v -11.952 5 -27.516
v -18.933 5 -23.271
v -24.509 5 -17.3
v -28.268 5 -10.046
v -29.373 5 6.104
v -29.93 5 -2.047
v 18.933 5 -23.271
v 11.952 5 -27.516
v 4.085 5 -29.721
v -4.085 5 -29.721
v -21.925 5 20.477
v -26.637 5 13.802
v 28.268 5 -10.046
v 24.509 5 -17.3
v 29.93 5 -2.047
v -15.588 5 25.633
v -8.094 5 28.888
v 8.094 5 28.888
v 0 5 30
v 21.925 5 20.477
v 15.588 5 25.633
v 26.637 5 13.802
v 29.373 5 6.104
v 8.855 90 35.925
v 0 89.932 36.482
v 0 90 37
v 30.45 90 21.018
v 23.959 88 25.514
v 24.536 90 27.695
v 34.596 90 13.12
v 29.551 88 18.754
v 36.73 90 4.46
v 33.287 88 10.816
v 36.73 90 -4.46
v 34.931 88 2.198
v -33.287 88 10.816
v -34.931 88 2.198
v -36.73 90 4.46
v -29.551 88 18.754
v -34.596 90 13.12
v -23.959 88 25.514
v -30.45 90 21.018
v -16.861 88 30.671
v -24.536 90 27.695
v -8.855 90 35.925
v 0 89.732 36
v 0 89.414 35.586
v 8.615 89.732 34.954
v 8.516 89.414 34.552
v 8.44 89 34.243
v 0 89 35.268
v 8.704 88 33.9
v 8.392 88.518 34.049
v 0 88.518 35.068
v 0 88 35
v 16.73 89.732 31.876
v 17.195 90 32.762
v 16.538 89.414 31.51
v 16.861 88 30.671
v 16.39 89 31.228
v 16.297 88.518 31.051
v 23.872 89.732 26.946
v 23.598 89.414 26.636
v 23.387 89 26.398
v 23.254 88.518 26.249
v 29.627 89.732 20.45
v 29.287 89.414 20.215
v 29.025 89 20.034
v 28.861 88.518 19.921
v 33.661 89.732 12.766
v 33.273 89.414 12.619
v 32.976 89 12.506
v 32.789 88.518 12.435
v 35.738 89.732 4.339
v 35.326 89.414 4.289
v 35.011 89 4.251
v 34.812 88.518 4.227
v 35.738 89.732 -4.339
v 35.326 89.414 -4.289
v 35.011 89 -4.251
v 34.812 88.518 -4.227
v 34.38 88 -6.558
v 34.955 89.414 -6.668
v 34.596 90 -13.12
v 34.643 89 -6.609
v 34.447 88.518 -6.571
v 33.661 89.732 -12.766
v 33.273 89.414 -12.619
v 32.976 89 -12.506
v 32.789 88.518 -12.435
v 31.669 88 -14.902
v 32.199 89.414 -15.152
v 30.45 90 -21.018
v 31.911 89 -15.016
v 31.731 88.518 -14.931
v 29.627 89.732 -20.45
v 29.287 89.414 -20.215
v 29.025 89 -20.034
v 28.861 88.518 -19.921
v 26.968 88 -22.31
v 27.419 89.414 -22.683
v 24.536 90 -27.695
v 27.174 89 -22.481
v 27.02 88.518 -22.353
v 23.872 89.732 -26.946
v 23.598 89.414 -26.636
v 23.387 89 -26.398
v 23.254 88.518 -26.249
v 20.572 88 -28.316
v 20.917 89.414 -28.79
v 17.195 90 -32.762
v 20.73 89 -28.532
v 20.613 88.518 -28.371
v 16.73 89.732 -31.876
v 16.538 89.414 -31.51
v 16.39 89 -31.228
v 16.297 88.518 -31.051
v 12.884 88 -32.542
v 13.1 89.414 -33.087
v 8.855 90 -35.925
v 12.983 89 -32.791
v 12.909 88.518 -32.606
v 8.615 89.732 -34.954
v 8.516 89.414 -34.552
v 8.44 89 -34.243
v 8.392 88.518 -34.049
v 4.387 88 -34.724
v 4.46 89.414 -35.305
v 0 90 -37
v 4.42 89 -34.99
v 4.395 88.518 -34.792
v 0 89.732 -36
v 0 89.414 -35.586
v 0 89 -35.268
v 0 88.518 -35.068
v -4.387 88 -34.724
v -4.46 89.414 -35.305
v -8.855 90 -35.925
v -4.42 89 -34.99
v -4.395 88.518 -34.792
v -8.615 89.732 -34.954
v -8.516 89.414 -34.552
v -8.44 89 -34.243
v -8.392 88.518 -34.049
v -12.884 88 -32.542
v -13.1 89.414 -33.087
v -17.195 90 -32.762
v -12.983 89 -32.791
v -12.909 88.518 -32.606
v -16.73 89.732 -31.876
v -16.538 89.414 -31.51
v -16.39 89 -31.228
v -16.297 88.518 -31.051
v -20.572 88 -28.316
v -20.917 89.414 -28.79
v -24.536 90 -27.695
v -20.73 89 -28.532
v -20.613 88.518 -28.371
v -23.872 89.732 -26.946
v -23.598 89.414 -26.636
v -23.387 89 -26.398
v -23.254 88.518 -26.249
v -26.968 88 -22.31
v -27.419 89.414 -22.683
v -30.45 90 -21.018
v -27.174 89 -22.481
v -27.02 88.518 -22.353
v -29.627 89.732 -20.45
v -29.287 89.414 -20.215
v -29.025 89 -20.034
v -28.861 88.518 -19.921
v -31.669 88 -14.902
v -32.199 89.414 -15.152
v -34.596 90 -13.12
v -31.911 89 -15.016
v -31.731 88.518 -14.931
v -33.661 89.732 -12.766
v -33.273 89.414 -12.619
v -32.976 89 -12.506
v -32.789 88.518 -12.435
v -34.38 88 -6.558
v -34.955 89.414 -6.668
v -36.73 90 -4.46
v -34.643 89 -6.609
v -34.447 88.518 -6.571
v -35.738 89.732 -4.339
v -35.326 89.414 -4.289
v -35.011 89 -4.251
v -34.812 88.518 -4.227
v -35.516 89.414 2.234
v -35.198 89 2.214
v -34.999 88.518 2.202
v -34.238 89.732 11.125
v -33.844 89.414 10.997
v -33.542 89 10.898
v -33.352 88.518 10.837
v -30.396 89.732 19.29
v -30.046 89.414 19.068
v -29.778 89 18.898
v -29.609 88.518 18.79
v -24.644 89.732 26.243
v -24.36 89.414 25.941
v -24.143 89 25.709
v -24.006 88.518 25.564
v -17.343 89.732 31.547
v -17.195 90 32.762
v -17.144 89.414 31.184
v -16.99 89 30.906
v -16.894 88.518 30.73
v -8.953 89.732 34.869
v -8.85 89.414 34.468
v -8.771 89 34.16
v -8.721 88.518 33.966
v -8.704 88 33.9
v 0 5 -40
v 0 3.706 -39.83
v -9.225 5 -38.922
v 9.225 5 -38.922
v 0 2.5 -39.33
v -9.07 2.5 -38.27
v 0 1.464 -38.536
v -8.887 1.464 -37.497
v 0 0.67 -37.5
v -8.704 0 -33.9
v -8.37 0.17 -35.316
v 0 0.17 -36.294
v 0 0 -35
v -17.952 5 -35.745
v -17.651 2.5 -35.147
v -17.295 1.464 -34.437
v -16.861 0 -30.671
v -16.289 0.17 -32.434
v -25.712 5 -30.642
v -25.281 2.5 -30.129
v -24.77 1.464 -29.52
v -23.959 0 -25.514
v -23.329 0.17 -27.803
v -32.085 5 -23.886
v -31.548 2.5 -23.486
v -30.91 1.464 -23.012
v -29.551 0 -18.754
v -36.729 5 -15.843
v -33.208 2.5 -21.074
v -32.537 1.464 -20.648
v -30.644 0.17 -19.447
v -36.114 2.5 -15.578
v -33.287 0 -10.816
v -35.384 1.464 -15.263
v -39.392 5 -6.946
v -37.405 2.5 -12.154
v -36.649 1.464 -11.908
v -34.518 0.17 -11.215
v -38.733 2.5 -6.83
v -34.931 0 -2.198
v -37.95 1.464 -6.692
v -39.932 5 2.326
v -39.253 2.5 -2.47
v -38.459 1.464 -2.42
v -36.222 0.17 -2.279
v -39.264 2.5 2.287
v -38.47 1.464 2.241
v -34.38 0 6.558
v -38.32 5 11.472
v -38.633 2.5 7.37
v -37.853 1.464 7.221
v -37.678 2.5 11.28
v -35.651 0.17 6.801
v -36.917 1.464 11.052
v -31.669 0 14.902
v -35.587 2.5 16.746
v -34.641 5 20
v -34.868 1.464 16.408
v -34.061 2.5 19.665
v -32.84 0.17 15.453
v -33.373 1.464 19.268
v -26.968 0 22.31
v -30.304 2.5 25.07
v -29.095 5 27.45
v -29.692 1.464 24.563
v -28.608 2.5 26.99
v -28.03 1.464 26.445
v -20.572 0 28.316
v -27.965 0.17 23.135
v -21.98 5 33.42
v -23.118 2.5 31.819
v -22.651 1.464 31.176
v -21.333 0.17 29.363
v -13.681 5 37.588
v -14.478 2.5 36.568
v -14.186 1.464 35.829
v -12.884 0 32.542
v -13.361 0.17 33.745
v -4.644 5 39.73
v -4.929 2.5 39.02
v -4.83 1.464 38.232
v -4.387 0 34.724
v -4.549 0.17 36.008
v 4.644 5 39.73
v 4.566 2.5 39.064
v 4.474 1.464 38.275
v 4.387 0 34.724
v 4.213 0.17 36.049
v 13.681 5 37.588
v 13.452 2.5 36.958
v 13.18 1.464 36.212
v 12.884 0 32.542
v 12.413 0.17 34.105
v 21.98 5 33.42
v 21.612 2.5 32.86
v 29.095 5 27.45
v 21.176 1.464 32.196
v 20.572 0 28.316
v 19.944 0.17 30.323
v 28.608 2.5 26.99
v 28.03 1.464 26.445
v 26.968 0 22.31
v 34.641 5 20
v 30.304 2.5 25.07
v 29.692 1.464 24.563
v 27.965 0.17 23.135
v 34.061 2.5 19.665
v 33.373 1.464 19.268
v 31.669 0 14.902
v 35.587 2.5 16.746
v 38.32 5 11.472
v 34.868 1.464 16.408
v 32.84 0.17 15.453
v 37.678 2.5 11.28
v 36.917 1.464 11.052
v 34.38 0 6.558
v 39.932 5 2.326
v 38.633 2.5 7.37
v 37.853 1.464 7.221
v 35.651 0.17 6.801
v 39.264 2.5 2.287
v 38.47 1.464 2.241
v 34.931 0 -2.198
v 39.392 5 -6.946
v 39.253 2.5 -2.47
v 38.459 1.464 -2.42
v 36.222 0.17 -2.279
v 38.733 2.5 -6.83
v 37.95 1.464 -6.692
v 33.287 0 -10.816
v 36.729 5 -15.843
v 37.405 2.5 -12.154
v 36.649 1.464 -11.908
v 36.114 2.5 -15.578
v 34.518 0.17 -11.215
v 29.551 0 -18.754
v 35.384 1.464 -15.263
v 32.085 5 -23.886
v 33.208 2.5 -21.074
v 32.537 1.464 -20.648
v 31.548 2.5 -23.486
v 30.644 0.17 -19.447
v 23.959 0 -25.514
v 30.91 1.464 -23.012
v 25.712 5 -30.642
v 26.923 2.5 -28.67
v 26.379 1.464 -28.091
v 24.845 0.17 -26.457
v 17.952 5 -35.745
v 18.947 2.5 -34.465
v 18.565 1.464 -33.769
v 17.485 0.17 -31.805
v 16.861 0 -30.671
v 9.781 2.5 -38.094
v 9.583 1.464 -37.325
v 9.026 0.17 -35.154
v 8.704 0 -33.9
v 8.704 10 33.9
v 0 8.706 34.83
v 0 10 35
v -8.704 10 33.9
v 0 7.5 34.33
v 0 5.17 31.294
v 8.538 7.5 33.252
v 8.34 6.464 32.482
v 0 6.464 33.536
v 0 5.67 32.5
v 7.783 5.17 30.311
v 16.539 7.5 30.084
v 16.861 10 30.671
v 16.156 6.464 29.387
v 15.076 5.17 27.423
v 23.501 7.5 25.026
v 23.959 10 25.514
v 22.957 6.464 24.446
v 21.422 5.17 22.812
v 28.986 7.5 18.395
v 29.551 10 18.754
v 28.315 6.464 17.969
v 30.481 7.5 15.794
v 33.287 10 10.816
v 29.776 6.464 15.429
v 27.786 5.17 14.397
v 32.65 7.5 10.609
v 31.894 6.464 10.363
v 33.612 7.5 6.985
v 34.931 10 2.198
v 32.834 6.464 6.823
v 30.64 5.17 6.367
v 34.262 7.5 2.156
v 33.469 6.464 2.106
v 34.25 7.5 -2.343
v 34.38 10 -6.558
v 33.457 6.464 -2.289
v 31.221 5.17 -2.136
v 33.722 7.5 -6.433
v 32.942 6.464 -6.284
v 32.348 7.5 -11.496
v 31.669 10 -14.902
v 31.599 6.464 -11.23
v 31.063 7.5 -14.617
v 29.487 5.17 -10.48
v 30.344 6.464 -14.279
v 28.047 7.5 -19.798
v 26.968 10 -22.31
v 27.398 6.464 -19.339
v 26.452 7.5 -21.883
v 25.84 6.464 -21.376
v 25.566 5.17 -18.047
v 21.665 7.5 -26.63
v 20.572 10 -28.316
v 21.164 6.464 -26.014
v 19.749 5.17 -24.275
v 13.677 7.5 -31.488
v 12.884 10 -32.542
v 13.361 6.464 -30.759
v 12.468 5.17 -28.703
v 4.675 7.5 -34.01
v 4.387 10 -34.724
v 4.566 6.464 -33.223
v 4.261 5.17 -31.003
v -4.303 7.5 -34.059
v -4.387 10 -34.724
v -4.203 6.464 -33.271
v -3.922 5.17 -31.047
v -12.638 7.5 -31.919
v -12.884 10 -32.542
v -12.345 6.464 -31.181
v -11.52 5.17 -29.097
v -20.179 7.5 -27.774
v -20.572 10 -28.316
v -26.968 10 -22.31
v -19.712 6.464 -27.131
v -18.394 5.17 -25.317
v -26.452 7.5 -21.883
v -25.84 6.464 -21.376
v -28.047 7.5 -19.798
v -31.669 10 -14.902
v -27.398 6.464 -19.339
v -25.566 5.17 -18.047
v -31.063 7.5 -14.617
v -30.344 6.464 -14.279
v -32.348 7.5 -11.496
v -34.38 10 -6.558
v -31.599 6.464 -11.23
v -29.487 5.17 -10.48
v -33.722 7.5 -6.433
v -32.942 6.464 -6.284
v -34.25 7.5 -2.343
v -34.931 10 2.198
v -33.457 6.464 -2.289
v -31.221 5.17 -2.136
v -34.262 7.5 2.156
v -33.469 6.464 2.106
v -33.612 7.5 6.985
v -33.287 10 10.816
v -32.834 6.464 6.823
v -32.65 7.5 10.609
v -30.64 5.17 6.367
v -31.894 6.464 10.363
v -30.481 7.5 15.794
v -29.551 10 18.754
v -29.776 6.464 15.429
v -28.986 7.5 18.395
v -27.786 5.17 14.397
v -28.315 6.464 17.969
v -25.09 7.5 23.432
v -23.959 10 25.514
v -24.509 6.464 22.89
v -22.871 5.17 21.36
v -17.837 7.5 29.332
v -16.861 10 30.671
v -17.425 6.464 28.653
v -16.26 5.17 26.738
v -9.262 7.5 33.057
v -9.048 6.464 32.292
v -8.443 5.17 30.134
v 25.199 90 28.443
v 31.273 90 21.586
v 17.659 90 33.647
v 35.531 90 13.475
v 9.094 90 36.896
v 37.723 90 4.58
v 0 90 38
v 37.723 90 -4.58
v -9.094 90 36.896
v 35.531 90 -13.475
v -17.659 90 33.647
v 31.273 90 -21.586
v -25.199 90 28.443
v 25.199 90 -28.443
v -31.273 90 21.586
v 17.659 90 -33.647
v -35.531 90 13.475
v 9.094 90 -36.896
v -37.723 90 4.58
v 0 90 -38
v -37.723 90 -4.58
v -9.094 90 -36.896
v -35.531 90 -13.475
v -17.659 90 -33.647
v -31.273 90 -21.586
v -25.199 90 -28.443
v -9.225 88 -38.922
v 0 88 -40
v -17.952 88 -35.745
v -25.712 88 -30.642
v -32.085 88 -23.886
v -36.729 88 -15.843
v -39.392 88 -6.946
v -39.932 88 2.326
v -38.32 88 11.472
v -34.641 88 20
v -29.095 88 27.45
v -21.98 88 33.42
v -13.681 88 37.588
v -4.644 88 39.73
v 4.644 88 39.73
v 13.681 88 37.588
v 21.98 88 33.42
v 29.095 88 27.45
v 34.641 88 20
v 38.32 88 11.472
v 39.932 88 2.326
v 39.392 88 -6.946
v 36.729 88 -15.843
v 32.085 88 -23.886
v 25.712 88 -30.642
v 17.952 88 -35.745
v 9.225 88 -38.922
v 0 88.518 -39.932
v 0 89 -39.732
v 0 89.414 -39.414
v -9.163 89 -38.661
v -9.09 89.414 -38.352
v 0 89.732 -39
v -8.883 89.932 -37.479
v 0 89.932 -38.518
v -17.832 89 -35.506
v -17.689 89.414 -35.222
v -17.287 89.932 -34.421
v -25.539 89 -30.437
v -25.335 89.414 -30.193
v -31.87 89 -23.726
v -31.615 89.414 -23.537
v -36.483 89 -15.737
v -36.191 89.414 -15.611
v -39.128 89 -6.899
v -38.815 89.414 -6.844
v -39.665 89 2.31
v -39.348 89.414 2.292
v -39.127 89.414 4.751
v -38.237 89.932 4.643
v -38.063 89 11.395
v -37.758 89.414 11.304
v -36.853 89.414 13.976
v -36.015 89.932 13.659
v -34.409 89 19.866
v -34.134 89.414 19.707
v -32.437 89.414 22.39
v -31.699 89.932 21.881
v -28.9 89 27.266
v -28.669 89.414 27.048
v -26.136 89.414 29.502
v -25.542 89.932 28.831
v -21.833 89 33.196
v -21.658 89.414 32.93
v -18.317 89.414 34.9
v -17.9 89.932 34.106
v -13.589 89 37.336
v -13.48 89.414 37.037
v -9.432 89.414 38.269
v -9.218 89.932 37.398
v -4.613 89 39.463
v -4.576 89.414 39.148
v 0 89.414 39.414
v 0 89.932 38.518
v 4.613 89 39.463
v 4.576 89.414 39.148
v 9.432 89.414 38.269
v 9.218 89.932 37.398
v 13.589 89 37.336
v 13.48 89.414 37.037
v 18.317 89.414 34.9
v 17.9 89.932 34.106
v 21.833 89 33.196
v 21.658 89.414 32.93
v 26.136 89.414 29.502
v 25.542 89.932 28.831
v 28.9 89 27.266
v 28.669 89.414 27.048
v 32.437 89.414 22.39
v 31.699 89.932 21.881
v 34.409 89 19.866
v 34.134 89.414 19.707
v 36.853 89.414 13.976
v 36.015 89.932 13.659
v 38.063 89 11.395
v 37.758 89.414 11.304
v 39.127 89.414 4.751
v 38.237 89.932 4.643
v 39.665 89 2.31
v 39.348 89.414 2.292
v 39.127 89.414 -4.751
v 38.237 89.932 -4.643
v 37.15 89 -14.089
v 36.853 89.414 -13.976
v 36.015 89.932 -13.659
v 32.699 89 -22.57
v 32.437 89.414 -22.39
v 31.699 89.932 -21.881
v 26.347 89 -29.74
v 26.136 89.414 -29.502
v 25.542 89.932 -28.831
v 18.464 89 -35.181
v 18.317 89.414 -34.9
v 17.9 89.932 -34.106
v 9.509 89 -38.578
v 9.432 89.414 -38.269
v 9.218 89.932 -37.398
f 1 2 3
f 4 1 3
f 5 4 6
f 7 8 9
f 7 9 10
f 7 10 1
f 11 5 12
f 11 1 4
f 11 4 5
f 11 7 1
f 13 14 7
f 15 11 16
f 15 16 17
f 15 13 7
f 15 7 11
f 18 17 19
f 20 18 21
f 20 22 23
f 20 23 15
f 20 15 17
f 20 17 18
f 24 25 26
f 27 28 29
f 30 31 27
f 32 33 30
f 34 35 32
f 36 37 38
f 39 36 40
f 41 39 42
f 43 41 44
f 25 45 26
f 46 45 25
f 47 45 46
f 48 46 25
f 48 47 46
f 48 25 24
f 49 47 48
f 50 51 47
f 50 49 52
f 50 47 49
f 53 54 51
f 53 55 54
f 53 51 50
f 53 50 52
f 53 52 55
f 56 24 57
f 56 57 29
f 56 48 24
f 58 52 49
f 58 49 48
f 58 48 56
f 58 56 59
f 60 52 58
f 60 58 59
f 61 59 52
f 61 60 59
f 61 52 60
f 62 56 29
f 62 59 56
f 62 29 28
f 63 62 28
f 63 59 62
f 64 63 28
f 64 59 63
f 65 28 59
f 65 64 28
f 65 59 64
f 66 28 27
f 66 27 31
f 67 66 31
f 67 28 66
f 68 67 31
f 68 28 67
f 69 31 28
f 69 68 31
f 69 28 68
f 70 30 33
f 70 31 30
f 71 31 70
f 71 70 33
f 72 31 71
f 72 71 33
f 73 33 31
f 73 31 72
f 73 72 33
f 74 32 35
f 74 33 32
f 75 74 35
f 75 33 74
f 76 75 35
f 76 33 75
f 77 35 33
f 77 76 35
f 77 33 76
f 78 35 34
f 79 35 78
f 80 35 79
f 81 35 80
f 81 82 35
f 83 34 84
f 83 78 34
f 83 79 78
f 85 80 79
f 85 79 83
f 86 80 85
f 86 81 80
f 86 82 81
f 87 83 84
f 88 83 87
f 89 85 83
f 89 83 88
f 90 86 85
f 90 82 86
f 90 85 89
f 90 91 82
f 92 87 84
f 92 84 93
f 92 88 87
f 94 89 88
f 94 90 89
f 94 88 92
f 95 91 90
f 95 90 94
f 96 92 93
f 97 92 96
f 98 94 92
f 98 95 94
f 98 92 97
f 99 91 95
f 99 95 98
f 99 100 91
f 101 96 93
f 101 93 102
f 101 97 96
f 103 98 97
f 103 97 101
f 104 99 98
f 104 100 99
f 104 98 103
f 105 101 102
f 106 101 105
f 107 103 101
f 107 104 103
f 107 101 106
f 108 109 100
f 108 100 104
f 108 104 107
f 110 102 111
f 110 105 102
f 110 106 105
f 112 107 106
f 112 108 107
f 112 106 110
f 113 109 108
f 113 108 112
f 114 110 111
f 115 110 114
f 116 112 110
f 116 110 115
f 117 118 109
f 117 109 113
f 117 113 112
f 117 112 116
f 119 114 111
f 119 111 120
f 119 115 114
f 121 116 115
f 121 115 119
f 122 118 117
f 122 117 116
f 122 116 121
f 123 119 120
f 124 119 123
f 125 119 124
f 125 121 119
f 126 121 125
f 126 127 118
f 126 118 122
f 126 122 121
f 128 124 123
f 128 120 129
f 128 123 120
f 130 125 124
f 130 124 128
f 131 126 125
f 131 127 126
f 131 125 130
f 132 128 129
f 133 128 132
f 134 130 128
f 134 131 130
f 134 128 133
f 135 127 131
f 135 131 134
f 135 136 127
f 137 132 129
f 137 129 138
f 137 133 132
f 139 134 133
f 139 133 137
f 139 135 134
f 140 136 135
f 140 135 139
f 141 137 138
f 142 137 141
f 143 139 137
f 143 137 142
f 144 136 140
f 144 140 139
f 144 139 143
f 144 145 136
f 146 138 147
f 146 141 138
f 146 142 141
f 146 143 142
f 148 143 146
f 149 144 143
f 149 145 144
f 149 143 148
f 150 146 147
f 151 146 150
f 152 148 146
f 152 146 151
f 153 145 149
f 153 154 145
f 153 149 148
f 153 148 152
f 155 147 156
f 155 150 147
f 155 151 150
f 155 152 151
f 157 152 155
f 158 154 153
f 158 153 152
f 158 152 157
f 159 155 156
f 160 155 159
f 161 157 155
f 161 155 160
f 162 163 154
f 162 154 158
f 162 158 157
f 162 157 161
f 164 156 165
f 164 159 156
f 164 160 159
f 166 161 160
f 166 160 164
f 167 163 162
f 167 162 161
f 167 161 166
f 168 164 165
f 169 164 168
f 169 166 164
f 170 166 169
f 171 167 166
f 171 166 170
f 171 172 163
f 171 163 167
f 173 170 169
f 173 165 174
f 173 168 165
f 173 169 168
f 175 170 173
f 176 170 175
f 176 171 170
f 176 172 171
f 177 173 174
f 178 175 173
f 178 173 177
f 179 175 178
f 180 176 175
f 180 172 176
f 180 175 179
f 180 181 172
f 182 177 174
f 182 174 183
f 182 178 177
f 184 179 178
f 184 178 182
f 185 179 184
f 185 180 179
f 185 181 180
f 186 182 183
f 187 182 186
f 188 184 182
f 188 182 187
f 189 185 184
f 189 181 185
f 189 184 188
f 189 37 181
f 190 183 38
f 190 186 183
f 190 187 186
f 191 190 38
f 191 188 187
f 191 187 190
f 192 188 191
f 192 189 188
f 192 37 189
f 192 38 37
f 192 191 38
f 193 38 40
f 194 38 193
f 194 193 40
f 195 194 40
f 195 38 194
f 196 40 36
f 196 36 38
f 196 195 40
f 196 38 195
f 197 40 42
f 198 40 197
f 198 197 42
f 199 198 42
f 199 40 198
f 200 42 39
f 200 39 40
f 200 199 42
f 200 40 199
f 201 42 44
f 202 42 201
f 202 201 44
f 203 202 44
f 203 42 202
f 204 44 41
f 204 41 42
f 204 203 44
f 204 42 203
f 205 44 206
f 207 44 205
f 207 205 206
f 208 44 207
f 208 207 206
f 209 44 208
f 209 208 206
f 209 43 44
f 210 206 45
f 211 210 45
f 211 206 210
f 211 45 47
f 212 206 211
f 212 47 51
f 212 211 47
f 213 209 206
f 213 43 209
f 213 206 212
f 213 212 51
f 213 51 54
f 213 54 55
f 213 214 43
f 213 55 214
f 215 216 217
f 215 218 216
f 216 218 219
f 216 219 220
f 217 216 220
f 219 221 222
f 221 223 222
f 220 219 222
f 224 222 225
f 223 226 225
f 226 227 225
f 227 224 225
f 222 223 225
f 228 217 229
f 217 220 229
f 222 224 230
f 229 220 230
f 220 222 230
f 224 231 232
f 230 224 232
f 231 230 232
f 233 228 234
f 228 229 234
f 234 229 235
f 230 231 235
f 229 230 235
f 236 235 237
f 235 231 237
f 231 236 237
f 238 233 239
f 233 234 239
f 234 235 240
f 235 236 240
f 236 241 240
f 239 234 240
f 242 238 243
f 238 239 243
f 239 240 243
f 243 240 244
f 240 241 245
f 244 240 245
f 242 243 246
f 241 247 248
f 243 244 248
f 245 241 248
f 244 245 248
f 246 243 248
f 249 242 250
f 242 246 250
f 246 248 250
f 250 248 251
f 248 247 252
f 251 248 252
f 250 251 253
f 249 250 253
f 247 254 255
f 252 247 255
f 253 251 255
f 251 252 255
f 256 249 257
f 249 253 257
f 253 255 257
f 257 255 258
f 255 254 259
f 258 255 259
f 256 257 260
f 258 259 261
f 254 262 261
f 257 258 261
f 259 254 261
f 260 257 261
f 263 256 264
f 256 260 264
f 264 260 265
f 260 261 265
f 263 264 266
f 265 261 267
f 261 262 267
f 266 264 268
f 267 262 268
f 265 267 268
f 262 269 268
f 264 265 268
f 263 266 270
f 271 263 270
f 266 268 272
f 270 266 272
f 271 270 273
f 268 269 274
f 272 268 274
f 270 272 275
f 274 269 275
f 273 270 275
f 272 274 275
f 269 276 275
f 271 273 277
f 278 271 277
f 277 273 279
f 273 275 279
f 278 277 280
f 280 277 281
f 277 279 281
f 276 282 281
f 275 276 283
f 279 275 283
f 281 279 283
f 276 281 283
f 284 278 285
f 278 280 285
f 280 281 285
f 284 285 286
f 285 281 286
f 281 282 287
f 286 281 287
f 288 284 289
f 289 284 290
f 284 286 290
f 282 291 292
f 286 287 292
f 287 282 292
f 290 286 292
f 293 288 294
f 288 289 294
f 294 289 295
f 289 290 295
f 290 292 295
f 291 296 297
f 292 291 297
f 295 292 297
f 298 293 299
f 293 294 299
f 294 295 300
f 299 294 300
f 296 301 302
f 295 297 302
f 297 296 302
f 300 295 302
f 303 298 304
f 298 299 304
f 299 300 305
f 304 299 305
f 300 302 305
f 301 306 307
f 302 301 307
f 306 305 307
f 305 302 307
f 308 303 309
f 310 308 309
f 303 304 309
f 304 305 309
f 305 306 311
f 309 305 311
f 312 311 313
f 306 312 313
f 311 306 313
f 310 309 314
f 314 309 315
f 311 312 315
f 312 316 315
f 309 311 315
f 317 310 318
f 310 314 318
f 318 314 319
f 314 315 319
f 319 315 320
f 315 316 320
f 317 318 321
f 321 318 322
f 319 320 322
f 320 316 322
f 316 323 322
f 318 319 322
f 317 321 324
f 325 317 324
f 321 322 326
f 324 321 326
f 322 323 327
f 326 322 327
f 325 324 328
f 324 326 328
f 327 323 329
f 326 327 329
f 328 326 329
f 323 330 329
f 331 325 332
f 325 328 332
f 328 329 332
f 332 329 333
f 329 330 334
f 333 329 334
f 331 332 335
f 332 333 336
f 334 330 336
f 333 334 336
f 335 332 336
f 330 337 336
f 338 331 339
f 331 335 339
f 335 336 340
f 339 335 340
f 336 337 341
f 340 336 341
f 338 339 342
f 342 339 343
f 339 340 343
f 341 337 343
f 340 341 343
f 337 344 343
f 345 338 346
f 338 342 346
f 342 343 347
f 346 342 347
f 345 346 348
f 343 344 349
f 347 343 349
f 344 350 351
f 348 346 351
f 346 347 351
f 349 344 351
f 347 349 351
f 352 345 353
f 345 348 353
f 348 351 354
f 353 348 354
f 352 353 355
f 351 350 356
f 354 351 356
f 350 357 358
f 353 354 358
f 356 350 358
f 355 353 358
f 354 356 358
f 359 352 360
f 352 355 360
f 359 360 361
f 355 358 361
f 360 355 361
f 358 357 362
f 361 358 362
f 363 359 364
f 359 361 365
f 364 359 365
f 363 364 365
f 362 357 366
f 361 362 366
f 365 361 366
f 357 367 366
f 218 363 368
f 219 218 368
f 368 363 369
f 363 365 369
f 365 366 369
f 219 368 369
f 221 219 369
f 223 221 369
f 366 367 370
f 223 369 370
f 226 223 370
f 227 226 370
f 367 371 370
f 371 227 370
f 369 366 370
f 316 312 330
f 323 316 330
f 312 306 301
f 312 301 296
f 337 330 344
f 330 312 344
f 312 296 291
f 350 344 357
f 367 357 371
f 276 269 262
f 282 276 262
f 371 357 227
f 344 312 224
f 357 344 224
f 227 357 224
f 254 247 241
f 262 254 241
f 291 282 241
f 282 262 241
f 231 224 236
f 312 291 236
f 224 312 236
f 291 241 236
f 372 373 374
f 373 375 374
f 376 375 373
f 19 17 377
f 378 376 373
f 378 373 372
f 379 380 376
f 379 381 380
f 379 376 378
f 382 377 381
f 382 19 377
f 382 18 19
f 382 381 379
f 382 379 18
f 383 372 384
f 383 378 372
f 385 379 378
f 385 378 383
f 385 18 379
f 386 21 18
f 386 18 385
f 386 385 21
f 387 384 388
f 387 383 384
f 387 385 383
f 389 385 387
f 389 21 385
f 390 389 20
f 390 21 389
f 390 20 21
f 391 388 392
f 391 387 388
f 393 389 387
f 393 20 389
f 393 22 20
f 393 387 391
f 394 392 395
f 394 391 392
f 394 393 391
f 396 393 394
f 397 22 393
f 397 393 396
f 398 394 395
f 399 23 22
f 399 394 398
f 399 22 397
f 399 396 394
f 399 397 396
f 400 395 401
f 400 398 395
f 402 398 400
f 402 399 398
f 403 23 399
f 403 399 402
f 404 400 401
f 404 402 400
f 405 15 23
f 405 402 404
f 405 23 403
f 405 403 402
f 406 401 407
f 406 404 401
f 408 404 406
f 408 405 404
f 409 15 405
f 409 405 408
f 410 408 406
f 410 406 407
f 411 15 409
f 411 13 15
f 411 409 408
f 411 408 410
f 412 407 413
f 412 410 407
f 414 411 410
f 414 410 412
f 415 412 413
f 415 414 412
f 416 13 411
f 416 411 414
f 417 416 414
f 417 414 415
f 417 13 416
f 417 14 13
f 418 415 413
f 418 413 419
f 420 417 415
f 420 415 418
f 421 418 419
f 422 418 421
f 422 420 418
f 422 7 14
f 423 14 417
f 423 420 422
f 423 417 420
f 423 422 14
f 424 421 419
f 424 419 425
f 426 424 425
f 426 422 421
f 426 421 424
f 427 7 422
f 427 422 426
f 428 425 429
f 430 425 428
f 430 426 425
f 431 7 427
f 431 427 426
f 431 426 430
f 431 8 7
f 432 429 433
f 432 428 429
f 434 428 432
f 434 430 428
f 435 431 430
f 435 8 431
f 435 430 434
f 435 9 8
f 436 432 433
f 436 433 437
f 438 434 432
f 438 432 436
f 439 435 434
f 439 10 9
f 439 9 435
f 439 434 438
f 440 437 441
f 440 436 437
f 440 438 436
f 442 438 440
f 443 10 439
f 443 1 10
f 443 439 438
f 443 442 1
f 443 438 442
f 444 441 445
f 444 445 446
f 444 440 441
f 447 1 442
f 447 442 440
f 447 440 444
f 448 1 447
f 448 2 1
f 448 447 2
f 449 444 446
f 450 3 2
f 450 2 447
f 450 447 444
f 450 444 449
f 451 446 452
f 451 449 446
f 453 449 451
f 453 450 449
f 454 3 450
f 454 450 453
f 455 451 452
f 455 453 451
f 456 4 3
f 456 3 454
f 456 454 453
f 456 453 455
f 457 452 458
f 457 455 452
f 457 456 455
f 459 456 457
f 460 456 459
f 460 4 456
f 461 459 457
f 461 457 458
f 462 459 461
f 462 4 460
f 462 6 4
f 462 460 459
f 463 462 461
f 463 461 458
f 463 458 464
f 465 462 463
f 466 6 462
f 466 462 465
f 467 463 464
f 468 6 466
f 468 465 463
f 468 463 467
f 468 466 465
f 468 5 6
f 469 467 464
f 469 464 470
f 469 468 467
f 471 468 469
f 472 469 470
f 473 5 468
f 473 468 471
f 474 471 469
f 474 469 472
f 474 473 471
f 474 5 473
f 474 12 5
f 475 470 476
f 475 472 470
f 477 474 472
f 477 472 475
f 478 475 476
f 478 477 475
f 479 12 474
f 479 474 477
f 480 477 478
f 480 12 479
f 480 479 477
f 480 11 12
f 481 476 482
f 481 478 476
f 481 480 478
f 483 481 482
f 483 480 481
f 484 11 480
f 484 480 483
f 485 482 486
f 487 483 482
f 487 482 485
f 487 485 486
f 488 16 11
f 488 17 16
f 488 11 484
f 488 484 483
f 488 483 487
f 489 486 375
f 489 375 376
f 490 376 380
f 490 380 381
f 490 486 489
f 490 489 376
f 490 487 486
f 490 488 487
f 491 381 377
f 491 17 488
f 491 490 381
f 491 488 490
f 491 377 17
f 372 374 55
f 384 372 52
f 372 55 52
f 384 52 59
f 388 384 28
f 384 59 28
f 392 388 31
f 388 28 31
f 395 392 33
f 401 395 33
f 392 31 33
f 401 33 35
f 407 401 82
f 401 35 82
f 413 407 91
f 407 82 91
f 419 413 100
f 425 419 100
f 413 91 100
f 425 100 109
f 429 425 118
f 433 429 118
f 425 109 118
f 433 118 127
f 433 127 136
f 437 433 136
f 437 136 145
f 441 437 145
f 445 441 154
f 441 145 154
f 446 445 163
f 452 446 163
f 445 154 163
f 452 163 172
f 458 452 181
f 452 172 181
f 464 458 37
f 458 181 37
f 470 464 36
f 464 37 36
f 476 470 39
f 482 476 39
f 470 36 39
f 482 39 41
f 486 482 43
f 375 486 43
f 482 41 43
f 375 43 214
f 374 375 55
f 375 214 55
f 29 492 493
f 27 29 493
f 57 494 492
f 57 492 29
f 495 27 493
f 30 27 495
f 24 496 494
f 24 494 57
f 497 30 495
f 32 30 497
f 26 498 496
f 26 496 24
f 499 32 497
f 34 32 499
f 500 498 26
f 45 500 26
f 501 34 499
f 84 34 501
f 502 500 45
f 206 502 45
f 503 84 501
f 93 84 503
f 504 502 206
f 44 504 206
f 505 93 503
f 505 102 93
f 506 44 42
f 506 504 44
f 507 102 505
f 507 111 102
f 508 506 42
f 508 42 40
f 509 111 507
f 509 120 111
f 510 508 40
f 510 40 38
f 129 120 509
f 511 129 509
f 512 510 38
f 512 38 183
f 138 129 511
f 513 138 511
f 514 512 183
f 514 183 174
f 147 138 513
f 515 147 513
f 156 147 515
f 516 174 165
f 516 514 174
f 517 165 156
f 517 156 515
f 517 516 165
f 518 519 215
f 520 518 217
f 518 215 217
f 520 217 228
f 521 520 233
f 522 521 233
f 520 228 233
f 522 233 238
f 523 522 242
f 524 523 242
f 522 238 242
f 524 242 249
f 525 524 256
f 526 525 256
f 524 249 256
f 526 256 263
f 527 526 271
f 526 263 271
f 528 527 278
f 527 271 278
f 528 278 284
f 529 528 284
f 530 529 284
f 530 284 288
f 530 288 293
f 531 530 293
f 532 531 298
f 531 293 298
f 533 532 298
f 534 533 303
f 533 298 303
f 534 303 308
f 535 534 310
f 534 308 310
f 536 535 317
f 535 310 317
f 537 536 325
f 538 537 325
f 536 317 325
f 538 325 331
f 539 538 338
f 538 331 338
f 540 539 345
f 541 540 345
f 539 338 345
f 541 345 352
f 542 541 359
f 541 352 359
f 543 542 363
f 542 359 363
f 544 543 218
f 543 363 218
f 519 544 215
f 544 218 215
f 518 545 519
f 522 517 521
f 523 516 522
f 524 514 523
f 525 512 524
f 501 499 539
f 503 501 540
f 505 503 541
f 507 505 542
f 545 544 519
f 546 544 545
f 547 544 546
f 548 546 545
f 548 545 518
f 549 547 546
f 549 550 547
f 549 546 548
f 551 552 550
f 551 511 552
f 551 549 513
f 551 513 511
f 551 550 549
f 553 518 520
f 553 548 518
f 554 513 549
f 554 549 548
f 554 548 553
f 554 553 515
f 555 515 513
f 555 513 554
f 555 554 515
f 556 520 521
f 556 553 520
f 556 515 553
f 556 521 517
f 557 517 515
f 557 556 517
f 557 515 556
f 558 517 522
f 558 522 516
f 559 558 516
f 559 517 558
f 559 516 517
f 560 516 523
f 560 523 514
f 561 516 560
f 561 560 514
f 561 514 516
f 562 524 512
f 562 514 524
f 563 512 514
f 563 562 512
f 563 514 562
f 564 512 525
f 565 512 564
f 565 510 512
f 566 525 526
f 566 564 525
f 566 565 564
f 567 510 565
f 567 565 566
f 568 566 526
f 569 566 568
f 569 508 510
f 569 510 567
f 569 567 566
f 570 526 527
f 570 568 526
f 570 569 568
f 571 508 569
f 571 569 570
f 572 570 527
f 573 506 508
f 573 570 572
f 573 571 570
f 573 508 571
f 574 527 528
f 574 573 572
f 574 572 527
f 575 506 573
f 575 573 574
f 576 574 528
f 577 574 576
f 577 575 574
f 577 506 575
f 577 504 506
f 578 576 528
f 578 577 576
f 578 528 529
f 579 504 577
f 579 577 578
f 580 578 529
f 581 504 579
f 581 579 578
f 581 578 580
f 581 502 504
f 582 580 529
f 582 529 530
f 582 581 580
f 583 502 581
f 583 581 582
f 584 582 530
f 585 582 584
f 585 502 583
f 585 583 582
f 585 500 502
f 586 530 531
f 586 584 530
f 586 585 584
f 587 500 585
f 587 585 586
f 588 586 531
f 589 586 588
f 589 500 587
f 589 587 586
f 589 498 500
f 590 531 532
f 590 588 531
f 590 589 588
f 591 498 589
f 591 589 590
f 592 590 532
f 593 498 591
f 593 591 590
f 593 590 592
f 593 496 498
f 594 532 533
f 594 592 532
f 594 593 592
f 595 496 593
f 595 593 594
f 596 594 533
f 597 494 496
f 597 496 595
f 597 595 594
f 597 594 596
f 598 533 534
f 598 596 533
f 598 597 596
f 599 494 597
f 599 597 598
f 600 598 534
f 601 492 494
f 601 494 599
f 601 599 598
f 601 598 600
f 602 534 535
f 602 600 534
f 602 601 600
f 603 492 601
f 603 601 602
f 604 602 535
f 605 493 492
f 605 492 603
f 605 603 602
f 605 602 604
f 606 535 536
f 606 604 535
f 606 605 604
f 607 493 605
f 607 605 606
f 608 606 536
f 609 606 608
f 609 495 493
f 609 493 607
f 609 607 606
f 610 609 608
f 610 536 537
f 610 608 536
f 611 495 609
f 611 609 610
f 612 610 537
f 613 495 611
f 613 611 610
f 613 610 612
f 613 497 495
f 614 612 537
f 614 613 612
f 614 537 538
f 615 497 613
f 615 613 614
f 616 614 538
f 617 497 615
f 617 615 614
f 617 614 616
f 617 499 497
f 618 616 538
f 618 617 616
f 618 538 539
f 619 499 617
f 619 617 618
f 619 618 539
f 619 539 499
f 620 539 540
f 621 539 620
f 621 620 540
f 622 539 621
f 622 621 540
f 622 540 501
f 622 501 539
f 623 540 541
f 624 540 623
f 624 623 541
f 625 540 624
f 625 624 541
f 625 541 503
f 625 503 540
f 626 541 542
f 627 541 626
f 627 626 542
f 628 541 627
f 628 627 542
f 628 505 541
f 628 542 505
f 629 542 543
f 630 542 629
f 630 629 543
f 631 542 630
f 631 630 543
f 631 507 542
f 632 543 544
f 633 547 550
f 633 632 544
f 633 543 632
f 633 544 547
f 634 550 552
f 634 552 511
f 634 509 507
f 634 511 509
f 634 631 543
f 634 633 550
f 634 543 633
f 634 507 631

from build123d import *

# Parameters (mm, degrees)
SKETCH1_R           = 40
BOSS_EXTRUDE1_DEPTH = 90
SKETCH2_R           = 35
CUT_EXTRUDE1_DEPTH  = 85
FILLET1_R           = 2
FILLET2_R           = 5


with BuildPart() as part:
    # Sketch1 → Boss-Extrude1 (new body)
    with BuildSketch(Plane(origin=(0, 0, 0), x_dir=(1, 0, 0), z_dir=(0, 1, 0))):
        with Locations(Location((0, 0, 0), (0, 0, 90))):
            Circle(SKETCH1_R)
    extrude(amount=BOSS_EXTRUDE1_DEPTH)

    # Sketch2 → Cut-Extrude1 (cut)
    with BuildSketch(Plane(origin=(0, 90, 0), x_dir=(1, 0, 0), z_dir=(0, 1, 0))):
        with Locations(Location((0, 0, 0), (0, 0, 270))):
            Circle(SKETCH2_R)
    extrude(amount=-CUT_EXTRUDE1_DEPTH, mode=Mode.SUBTRACT)

    # Fillet1
    fillet1_edges = [part.edges().sort_by_distance(p)[0] for p in [
        (0, 90, 40),
        (0, 90, -35),
    ]]
    fillet(fillet1_edges, radius=FILLET1_R)

    # Fillet2
    fillet2_edges = [part.edges().sort_by_distance(p)[0] for p in [
        (0, 0, 40),
        (0, 5, -35),
    ]]
    fillet(fillet2_edges, radius=FILLET2_R)


solid = part.part
